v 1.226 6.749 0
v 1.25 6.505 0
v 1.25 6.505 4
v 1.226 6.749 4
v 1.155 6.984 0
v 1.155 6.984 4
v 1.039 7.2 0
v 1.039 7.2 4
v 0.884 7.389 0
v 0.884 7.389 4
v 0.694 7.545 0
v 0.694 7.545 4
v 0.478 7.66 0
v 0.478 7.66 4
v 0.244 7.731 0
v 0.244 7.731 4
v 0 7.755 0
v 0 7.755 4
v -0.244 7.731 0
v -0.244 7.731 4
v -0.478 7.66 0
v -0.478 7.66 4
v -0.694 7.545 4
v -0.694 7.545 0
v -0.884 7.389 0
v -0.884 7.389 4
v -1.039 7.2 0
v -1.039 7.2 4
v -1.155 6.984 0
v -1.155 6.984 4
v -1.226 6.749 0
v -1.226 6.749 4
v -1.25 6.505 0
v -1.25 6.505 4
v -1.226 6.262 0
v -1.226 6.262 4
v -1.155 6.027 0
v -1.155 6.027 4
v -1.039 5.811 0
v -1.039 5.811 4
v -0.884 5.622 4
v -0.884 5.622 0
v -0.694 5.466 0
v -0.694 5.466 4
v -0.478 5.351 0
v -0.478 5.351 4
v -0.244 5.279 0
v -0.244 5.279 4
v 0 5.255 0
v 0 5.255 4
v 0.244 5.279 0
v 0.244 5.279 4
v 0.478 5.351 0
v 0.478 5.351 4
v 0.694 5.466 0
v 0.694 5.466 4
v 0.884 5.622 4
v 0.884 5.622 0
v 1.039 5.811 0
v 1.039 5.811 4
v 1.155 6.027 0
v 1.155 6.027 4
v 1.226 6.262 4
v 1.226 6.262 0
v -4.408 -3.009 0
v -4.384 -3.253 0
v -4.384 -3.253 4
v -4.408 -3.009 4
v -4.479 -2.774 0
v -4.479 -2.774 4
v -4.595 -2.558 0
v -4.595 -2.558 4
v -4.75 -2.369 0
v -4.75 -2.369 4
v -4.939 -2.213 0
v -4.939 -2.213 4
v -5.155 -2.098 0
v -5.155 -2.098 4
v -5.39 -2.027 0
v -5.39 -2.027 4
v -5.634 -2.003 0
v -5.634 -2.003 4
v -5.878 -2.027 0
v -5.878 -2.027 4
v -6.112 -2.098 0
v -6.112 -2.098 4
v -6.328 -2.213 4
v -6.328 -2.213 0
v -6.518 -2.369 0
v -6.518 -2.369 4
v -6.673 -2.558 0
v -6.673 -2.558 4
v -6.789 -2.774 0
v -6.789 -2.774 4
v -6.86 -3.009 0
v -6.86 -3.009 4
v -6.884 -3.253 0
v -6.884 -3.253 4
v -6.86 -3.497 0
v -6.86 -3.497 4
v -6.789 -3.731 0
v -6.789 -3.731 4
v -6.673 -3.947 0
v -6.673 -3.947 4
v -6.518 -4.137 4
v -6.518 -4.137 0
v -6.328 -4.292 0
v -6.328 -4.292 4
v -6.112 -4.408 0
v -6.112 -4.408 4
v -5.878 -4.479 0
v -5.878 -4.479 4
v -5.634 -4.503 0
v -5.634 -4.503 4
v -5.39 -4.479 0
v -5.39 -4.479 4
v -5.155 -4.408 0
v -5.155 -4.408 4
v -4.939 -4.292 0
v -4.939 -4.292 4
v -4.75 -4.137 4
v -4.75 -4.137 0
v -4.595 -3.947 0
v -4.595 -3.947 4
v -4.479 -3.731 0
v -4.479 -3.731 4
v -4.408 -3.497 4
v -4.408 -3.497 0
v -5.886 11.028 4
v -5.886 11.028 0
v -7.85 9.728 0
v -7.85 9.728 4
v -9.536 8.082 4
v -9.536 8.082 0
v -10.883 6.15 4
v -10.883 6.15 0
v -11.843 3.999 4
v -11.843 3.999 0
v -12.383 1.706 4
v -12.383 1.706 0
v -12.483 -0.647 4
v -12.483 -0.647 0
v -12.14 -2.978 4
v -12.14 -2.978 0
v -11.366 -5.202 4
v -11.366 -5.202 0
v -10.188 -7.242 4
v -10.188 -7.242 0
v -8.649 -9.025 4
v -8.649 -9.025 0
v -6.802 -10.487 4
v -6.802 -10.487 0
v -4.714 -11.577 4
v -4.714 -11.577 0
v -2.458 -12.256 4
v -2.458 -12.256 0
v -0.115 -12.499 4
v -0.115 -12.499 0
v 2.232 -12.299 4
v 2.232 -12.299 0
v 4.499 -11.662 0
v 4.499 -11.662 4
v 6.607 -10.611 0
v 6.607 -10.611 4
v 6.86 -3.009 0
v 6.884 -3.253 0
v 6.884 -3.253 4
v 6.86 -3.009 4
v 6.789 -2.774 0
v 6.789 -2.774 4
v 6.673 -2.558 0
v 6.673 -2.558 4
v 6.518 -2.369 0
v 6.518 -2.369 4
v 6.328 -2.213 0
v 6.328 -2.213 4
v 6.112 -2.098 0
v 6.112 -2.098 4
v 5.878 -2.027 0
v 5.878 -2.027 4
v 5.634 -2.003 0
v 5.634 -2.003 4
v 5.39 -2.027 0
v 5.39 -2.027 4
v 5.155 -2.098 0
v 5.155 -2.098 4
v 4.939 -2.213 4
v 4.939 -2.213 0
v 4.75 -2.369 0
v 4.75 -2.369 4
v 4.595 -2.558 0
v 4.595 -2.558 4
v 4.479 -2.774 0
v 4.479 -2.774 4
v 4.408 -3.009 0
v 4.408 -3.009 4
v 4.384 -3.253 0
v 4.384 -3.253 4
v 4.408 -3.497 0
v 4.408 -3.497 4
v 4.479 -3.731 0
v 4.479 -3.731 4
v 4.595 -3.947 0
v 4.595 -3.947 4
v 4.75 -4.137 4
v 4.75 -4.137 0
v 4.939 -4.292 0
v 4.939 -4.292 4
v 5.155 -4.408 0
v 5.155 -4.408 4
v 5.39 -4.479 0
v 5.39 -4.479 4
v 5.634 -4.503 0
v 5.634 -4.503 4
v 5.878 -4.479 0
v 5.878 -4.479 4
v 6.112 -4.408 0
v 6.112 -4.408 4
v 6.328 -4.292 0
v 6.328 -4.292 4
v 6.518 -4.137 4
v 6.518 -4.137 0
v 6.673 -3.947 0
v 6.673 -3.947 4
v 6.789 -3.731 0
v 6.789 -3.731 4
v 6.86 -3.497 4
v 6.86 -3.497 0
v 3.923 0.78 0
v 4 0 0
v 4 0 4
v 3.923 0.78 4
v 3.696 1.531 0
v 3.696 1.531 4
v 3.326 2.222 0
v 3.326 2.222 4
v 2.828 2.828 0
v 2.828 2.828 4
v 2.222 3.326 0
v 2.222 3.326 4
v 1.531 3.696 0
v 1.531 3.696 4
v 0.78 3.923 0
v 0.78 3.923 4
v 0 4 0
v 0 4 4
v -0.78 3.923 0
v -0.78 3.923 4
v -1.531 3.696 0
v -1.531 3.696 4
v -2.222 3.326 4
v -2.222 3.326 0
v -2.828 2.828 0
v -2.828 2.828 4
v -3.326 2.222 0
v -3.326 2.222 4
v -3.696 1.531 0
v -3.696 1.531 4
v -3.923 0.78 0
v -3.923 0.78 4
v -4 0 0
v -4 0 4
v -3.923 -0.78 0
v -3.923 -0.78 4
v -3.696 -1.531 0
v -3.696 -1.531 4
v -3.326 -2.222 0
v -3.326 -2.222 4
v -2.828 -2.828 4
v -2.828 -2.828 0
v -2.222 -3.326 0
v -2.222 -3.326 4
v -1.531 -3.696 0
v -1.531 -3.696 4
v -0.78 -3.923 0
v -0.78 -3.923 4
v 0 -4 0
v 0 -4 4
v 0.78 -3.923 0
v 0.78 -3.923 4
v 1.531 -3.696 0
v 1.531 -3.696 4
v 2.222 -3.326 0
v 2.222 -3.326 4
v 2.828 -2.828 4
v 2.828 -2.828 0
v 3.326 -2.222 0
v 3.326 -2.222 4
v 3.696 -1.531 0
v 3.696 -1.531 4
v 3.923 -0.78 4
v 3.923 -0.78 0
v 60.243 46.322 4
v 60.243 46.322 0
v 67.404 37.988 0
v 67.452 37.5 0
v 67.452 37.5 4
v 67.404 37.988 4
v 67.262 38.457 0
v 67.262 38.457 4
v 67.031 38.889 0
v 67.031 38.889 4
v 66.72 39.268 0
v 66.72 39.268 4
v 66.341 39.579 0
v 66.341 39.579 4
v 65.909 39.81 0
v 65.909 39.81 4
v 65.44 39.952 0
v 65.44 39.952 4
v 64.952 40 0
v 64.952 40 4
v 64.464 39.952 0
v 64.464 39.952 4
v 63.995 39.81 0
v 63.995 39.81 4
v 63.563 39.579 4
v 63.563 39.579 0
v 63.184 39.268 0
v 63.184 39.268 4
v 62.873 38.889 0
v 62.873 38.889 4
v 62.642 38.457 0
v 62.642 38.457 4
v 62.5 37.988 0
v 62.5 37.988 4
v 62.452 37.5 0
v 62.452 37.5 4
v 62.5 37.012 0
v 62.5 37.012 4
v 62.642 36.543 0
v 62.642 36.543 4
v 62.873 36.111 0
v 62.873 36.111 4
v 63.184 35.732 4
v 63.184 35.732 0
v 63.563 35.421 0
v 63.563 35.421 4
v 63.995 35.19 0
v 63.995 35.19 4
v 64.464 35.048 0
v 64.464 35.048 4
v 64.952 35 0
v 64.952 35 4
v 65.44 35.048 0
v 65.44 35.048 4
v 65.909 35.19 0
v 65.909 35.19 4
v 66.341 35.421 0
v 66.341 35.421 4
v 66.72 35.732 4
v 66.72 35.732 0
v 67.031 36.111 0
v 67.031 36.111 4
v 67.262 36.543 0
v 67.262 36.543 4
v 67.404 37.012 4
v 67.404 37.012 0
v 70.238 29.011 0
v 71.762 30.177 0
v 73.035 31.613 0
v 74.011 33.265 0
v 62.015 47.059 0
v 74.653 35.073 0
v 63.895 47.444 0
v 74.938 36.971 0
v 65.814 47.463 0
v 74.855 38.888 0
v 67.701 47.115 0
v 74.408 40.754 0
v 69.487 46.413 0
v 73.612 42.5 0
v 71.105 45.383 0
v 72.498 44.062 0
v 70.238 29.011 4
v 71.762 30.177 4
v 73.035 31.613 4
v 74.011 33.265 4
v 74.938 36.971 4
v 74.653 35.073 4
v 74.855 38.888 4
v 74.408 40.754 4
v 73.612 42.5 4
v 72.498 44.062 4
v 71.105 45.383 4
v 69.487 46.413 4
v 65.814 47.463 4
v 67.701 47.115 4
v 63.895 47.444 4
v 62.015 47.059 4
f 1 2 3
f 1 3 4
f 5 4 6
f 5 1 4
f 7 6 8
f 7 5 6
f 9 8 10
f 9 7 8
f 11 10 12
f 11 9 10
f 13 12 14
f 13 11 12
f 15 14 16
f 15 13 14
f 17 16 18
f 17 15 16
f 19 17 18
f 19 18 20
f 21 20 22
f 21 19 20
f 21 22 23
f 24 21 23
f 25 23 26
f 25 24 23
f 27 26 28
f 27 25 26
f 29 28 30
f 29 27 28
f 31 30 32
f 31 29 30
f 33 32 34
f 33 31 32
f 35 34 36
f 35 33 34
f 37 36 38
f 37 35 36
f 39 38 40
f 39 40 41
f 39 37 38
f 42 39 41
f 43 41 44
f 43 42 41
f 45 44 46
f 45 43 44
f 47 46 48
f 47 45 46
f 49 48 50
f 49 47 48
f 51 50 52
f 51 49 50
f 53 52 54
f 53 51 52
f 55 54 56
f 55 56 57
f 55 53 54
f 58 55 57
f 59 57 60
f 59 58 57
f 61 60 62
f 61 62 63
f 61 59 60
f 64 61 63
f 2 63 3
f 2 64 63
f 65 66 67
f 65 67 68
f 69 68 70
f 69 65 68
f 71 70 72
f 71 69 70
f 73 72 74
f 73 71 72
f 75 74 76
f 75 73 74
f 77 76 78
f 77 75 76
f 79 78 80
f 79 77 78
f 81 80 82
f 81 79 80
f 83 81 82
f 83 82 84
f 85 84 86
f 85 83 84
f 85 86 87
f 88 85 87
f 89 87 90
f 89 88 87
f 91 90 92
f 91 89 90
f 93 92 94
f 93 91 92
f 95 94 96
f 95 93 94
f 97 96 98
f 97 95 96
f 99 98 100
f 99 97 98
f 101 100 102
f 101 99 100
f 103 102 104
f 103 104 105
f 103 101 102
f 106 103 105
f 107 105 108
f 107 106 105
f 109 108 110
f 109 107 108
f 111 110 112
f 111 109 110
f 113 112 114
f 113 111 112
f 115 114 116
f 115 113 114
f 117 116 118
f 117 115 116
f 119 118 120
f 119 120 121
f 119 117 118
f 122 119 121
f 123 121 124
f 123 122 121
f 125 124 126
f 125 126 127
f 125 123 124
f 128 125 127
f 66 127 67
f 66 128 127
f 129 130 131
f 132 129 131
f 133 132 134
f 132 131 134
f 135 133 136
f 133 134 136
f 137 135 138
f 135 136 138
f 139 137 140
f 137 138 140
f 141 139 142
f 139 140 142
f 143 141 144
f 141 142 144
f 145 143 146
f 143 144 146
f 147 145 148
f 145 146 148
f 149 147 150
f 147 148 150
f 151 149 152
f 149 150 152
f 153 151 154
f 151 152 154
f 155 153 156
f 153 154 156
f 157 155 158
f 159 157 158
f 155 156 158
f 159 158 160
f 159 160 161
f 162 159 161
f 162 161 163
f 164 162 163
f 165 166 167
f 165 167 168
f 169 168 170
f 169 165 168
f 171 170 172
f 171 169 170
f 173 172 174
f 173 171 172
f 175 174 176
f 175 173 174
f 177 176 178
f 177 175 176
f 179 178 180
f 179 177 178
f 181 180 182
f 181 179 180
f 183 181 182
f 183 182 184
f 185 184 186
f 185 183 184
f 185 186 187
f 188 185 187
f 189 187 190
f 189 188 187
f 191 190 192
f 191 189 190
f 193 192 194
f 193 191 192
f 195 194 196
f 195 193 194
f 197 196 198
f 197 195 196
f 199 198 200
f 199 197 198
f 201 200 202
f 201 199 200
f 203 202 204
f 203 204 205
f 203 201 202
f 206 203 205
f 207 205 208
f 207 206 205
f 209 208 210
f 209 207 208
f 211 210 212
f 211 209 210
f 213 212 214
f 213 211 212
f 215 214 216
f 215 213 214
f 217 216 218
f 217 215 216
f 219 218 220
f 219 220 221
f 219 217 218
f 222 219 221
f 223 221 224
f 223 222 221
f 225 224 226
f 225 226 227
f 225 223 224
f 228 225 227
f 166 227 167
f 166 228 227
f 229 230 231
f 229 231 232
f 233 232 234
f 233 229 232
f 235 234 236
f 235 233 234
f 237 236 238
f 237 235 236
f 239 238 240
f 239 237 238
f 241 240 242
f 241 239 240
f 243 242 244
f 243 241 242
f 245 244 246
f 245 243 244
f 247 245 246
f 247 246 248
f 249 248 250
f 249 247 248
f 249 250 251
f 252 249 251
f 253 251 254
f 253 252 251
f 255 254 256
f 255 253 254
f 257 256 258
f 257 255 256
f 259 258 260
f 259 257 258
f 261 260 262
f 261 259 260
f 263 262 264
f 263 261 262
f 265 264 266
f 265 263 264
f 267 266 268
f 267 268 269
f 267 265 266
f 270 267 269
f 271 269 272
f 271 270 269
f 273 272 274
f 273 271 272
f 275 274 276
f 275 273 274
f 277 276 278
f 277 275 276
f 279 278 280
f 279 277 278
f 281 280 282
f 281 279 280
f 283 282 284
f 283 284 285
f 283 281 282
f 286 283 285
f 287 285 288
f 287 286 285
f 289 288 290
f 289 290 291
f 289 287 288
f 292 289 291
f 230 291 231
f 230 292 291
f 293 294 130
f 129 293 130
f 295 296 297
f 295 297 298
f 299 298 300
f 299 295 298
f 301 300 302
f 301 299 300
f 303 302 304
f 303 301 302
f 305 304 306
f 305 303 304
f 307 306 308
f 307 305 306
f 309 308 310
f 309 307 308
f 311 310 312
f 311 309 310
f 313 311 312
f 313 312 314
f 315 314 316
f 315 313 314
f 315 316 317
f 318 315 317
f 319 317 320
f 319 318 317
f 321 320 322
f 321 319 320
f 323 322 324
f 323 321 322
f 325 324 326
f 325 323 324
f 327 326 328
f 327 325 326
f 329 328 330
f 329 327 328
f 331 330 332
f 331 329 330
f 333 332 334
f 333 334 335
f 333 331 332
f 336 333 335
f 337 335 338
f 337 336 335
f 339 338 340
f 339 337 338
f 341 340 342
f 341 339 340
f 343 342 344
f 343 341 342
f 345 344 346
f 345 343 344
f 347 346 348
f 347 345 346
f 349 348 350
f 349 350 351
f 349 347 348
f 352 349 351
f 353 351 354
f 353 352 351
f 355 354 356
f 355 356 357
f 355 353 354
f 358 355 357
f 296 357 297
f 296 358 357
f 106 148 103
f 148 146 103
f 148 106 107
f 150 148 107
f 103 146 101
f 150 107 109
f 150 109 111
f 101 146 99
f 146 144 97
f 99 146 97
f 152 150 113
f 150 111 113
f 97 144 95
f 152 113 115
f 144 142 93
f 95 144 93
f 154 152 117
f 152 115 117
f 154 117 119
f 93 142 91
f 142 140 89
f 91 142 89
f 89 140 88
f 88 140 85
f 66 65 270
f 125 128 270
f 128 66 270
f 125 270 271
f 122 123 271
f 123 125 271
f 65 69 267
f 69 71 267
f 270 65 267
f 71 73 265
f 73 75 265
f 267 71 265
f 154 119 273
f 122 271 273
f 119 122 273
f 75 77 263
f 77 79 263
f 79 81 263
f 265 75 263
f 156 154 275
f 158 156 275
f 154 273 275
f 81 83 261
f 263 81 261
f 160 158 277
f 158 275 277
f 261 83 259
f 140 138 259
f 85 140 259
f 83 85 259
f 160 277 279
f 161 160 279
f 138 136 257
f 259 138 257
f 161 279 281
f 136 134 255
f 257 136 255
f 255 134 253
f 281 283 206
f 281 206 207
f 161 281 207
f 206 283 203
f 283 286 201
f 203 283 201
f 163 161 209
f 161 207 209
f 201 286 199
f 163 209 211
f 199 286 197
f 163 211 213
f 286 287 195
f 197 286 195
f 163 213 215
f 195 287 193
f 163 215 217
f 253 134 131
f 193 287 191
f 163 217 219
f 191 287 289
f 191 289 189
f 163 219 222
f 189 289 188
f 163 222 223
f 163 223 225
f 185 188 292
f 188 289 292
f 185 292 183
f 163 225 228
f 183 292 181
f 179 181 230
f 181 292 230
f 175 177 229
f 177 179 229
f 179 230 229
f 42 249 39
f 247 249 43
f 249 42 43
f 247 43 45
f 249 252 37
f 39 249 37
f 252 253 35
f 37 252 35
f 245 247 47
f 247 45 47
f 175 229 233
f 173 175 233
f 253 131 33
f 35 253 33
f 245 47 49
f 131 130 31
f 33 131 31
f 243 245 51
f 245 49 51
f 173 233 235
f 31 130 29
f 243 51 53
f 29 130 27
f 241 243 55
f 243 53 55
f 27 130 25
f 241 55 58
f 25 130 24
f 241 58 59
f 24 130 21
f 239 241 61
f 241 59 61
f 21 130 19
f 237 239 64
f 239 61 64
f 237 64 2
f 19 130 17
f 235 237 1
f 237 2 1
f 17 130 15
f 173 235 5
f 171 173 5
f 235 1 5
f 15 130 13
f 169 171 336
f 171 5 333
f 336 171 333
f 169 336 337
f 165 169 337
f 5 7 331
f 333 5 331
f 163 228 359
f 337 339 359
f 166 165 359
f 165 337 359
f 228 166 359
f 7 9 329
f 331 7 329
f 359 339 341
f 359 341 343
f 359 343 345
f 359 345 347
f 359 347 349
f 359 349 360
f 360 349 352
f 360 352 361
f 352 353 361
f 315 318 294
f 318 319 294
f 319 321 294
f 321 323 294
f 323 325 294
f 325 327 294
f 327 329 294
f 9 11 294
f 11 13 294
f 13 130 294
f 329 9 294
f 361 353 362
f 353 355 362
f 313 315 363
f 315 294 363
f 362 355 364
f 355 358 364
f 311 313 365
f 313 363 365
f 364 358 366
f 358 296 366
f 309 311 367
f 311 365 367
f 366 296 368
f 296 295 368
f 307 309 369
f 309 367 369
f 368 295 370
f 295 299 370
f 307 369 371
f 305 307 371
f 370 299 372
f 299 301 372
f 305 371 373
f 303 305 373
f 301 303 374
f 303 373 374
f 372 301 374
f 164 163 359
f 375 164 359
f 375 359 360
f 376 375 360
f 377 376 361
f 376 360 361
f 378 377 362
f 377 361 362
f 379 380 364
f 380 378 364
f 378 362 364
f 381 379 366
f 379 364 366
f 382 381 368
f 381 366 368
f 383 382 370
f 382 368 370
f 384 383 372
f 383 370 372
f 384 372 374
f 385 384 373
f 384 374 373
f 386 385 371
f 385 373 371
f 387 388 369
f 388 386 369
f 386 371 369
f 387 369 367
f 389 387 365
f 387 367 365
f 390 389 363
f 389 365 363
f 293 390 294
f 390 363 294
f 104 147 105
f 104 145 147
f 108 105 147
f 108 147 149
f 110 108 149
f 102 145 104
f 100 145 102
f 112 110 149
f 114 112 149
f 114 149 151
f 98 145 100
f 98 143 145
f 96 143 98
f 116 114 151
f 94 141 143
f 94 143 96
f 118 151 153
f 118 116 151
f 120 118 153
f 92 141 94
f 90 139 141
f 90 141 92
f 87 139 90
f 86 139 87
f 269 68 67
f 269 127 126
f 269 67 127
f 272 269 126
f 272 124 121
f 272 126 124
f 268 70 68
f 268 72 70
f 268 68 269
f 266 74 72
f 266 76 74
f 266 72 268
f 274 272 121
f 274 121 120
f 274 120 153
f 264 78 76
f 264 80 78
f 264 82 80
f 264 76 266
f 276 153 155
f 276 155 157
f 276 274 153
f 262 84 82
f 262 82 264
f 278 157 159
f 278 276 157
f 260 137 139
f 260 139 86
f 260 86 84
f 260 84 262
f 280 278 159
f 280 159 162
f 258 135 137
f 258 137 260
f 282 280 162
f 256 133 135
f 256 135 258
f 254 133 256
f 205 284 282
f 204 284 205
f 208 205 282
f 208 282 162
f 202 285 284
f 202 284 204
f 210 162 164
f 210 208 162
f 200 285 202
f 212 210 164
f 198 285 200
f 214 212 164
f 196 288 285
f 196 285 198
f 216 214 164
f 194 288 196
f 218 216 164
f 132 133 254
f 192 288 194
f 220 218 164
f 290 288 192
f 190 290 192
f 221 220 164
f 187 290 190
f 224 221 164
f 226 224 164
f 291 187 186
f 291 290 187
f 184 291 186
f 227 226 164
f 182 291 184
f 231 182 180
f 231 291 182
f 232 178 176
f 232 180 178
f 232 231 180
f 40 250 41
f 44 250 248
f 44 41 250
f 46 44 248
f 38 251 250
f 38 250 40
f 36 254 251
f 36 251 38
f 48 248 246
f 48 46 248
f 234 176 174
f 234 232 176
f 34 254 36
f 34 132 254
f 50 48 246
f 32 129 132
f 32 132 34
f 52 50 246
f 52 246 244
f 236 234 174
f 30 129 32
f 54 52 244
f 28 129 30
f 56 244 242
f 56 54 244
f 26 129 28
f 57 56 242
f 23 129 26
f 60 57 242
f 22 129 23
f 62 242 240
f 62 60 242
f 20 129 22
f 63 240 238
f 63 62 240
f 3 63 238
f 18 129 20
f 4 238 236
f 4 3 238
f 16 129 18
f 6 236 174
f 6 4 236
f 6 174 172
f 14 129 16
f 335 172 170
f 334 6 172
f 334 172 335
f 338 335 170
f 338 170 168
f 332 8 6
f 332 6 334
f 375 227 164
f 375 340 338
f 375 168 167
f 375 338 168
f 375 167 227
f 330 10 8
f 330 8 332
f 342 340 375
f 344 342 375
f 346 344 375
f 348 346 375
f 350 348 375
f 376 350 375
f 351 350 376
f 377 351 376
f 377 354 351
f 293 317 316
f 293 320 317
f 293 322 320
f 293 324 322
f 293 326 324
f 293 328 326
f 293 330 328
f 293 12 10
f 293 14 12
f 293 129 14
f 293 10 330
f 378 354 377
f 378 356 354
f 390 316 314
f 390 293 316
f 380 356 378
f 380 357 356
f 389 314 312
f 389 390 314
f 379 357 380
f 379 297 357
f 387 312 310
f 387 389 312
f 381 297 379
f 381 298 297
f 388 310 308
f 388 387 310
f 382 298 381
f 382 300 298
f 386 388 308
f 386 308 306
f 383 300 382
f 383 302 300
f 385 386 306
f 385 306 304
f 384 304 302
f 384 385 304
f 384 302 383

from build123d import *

# Parameters (mm, degrees)
SKETCH1_R           = 12.5
SKETCH1_R_2         = 4
SKETCH1_R_3         = 1.25
SKETCH1_R_4         = 10
SKETCH1_R_5         = 2.5
BOSS_EXTRUDE1_DEPTH = 4


with BuildPart() as part:
    # Sketch1 → Boss-Extrude1 (new body)
    # profile 1 of 3: a face of its own
    with BuildSketch(Plane.XY):
        Circle(SKETCH1_R)
        Circle(SKETCH1_R_2, mode=Mode.SUBTRACT)
        with Locations((0, 6.505402357)):
            Circle(SKETCH1_R_3, mode=Mode.SUBTRACT)
        with Locations((5.633843703, -3.252701179)):
            Circle(SKETCH1_R_3, mode=Mode.SUBTRACT)
        with Locations((-5.633843703, -3.252701179)):
            Circle(SKETCH1_R_3, mode=Mode.SUBTRACT)
    # profile 2 of 3: a face of its own
    with BuildSketch(Plane.XY):
        with BuildLine():
            ThreePointArc((70.237801869, 29.011225218), (56.291651246, 32.5), (60.243358968, 46.322108115))
            Line((60.243358968, 46.322108115), (-5.885682894, 11.027635144))
            ThreePointArc((-5.885682894, 11.027635144), (6.429578673, 10.719632367), (12.5, 0))
            ThreePointArc((12.5, 0), (10.92799465, -6.068684613), (6.607370731, -10.610968477))
            Line((6.607370731, -10.610968477), (70.237801869, 29.011225218))
        make_face()
    # profile 3 of 3: a face of its own
    with BuildSketch(Plane.XY):
        with Locations((64.951905284, 37.5)):
            Circle(SKETCH1_R_4)
        with Locations((64.951905284, 37.5)):
            Circle(SKETCH1_R_5, mode=Mode.SUBTRACT)
    extrude(amount=BOSS_EXTRUDE1_DEPTH)


solid = part.part
